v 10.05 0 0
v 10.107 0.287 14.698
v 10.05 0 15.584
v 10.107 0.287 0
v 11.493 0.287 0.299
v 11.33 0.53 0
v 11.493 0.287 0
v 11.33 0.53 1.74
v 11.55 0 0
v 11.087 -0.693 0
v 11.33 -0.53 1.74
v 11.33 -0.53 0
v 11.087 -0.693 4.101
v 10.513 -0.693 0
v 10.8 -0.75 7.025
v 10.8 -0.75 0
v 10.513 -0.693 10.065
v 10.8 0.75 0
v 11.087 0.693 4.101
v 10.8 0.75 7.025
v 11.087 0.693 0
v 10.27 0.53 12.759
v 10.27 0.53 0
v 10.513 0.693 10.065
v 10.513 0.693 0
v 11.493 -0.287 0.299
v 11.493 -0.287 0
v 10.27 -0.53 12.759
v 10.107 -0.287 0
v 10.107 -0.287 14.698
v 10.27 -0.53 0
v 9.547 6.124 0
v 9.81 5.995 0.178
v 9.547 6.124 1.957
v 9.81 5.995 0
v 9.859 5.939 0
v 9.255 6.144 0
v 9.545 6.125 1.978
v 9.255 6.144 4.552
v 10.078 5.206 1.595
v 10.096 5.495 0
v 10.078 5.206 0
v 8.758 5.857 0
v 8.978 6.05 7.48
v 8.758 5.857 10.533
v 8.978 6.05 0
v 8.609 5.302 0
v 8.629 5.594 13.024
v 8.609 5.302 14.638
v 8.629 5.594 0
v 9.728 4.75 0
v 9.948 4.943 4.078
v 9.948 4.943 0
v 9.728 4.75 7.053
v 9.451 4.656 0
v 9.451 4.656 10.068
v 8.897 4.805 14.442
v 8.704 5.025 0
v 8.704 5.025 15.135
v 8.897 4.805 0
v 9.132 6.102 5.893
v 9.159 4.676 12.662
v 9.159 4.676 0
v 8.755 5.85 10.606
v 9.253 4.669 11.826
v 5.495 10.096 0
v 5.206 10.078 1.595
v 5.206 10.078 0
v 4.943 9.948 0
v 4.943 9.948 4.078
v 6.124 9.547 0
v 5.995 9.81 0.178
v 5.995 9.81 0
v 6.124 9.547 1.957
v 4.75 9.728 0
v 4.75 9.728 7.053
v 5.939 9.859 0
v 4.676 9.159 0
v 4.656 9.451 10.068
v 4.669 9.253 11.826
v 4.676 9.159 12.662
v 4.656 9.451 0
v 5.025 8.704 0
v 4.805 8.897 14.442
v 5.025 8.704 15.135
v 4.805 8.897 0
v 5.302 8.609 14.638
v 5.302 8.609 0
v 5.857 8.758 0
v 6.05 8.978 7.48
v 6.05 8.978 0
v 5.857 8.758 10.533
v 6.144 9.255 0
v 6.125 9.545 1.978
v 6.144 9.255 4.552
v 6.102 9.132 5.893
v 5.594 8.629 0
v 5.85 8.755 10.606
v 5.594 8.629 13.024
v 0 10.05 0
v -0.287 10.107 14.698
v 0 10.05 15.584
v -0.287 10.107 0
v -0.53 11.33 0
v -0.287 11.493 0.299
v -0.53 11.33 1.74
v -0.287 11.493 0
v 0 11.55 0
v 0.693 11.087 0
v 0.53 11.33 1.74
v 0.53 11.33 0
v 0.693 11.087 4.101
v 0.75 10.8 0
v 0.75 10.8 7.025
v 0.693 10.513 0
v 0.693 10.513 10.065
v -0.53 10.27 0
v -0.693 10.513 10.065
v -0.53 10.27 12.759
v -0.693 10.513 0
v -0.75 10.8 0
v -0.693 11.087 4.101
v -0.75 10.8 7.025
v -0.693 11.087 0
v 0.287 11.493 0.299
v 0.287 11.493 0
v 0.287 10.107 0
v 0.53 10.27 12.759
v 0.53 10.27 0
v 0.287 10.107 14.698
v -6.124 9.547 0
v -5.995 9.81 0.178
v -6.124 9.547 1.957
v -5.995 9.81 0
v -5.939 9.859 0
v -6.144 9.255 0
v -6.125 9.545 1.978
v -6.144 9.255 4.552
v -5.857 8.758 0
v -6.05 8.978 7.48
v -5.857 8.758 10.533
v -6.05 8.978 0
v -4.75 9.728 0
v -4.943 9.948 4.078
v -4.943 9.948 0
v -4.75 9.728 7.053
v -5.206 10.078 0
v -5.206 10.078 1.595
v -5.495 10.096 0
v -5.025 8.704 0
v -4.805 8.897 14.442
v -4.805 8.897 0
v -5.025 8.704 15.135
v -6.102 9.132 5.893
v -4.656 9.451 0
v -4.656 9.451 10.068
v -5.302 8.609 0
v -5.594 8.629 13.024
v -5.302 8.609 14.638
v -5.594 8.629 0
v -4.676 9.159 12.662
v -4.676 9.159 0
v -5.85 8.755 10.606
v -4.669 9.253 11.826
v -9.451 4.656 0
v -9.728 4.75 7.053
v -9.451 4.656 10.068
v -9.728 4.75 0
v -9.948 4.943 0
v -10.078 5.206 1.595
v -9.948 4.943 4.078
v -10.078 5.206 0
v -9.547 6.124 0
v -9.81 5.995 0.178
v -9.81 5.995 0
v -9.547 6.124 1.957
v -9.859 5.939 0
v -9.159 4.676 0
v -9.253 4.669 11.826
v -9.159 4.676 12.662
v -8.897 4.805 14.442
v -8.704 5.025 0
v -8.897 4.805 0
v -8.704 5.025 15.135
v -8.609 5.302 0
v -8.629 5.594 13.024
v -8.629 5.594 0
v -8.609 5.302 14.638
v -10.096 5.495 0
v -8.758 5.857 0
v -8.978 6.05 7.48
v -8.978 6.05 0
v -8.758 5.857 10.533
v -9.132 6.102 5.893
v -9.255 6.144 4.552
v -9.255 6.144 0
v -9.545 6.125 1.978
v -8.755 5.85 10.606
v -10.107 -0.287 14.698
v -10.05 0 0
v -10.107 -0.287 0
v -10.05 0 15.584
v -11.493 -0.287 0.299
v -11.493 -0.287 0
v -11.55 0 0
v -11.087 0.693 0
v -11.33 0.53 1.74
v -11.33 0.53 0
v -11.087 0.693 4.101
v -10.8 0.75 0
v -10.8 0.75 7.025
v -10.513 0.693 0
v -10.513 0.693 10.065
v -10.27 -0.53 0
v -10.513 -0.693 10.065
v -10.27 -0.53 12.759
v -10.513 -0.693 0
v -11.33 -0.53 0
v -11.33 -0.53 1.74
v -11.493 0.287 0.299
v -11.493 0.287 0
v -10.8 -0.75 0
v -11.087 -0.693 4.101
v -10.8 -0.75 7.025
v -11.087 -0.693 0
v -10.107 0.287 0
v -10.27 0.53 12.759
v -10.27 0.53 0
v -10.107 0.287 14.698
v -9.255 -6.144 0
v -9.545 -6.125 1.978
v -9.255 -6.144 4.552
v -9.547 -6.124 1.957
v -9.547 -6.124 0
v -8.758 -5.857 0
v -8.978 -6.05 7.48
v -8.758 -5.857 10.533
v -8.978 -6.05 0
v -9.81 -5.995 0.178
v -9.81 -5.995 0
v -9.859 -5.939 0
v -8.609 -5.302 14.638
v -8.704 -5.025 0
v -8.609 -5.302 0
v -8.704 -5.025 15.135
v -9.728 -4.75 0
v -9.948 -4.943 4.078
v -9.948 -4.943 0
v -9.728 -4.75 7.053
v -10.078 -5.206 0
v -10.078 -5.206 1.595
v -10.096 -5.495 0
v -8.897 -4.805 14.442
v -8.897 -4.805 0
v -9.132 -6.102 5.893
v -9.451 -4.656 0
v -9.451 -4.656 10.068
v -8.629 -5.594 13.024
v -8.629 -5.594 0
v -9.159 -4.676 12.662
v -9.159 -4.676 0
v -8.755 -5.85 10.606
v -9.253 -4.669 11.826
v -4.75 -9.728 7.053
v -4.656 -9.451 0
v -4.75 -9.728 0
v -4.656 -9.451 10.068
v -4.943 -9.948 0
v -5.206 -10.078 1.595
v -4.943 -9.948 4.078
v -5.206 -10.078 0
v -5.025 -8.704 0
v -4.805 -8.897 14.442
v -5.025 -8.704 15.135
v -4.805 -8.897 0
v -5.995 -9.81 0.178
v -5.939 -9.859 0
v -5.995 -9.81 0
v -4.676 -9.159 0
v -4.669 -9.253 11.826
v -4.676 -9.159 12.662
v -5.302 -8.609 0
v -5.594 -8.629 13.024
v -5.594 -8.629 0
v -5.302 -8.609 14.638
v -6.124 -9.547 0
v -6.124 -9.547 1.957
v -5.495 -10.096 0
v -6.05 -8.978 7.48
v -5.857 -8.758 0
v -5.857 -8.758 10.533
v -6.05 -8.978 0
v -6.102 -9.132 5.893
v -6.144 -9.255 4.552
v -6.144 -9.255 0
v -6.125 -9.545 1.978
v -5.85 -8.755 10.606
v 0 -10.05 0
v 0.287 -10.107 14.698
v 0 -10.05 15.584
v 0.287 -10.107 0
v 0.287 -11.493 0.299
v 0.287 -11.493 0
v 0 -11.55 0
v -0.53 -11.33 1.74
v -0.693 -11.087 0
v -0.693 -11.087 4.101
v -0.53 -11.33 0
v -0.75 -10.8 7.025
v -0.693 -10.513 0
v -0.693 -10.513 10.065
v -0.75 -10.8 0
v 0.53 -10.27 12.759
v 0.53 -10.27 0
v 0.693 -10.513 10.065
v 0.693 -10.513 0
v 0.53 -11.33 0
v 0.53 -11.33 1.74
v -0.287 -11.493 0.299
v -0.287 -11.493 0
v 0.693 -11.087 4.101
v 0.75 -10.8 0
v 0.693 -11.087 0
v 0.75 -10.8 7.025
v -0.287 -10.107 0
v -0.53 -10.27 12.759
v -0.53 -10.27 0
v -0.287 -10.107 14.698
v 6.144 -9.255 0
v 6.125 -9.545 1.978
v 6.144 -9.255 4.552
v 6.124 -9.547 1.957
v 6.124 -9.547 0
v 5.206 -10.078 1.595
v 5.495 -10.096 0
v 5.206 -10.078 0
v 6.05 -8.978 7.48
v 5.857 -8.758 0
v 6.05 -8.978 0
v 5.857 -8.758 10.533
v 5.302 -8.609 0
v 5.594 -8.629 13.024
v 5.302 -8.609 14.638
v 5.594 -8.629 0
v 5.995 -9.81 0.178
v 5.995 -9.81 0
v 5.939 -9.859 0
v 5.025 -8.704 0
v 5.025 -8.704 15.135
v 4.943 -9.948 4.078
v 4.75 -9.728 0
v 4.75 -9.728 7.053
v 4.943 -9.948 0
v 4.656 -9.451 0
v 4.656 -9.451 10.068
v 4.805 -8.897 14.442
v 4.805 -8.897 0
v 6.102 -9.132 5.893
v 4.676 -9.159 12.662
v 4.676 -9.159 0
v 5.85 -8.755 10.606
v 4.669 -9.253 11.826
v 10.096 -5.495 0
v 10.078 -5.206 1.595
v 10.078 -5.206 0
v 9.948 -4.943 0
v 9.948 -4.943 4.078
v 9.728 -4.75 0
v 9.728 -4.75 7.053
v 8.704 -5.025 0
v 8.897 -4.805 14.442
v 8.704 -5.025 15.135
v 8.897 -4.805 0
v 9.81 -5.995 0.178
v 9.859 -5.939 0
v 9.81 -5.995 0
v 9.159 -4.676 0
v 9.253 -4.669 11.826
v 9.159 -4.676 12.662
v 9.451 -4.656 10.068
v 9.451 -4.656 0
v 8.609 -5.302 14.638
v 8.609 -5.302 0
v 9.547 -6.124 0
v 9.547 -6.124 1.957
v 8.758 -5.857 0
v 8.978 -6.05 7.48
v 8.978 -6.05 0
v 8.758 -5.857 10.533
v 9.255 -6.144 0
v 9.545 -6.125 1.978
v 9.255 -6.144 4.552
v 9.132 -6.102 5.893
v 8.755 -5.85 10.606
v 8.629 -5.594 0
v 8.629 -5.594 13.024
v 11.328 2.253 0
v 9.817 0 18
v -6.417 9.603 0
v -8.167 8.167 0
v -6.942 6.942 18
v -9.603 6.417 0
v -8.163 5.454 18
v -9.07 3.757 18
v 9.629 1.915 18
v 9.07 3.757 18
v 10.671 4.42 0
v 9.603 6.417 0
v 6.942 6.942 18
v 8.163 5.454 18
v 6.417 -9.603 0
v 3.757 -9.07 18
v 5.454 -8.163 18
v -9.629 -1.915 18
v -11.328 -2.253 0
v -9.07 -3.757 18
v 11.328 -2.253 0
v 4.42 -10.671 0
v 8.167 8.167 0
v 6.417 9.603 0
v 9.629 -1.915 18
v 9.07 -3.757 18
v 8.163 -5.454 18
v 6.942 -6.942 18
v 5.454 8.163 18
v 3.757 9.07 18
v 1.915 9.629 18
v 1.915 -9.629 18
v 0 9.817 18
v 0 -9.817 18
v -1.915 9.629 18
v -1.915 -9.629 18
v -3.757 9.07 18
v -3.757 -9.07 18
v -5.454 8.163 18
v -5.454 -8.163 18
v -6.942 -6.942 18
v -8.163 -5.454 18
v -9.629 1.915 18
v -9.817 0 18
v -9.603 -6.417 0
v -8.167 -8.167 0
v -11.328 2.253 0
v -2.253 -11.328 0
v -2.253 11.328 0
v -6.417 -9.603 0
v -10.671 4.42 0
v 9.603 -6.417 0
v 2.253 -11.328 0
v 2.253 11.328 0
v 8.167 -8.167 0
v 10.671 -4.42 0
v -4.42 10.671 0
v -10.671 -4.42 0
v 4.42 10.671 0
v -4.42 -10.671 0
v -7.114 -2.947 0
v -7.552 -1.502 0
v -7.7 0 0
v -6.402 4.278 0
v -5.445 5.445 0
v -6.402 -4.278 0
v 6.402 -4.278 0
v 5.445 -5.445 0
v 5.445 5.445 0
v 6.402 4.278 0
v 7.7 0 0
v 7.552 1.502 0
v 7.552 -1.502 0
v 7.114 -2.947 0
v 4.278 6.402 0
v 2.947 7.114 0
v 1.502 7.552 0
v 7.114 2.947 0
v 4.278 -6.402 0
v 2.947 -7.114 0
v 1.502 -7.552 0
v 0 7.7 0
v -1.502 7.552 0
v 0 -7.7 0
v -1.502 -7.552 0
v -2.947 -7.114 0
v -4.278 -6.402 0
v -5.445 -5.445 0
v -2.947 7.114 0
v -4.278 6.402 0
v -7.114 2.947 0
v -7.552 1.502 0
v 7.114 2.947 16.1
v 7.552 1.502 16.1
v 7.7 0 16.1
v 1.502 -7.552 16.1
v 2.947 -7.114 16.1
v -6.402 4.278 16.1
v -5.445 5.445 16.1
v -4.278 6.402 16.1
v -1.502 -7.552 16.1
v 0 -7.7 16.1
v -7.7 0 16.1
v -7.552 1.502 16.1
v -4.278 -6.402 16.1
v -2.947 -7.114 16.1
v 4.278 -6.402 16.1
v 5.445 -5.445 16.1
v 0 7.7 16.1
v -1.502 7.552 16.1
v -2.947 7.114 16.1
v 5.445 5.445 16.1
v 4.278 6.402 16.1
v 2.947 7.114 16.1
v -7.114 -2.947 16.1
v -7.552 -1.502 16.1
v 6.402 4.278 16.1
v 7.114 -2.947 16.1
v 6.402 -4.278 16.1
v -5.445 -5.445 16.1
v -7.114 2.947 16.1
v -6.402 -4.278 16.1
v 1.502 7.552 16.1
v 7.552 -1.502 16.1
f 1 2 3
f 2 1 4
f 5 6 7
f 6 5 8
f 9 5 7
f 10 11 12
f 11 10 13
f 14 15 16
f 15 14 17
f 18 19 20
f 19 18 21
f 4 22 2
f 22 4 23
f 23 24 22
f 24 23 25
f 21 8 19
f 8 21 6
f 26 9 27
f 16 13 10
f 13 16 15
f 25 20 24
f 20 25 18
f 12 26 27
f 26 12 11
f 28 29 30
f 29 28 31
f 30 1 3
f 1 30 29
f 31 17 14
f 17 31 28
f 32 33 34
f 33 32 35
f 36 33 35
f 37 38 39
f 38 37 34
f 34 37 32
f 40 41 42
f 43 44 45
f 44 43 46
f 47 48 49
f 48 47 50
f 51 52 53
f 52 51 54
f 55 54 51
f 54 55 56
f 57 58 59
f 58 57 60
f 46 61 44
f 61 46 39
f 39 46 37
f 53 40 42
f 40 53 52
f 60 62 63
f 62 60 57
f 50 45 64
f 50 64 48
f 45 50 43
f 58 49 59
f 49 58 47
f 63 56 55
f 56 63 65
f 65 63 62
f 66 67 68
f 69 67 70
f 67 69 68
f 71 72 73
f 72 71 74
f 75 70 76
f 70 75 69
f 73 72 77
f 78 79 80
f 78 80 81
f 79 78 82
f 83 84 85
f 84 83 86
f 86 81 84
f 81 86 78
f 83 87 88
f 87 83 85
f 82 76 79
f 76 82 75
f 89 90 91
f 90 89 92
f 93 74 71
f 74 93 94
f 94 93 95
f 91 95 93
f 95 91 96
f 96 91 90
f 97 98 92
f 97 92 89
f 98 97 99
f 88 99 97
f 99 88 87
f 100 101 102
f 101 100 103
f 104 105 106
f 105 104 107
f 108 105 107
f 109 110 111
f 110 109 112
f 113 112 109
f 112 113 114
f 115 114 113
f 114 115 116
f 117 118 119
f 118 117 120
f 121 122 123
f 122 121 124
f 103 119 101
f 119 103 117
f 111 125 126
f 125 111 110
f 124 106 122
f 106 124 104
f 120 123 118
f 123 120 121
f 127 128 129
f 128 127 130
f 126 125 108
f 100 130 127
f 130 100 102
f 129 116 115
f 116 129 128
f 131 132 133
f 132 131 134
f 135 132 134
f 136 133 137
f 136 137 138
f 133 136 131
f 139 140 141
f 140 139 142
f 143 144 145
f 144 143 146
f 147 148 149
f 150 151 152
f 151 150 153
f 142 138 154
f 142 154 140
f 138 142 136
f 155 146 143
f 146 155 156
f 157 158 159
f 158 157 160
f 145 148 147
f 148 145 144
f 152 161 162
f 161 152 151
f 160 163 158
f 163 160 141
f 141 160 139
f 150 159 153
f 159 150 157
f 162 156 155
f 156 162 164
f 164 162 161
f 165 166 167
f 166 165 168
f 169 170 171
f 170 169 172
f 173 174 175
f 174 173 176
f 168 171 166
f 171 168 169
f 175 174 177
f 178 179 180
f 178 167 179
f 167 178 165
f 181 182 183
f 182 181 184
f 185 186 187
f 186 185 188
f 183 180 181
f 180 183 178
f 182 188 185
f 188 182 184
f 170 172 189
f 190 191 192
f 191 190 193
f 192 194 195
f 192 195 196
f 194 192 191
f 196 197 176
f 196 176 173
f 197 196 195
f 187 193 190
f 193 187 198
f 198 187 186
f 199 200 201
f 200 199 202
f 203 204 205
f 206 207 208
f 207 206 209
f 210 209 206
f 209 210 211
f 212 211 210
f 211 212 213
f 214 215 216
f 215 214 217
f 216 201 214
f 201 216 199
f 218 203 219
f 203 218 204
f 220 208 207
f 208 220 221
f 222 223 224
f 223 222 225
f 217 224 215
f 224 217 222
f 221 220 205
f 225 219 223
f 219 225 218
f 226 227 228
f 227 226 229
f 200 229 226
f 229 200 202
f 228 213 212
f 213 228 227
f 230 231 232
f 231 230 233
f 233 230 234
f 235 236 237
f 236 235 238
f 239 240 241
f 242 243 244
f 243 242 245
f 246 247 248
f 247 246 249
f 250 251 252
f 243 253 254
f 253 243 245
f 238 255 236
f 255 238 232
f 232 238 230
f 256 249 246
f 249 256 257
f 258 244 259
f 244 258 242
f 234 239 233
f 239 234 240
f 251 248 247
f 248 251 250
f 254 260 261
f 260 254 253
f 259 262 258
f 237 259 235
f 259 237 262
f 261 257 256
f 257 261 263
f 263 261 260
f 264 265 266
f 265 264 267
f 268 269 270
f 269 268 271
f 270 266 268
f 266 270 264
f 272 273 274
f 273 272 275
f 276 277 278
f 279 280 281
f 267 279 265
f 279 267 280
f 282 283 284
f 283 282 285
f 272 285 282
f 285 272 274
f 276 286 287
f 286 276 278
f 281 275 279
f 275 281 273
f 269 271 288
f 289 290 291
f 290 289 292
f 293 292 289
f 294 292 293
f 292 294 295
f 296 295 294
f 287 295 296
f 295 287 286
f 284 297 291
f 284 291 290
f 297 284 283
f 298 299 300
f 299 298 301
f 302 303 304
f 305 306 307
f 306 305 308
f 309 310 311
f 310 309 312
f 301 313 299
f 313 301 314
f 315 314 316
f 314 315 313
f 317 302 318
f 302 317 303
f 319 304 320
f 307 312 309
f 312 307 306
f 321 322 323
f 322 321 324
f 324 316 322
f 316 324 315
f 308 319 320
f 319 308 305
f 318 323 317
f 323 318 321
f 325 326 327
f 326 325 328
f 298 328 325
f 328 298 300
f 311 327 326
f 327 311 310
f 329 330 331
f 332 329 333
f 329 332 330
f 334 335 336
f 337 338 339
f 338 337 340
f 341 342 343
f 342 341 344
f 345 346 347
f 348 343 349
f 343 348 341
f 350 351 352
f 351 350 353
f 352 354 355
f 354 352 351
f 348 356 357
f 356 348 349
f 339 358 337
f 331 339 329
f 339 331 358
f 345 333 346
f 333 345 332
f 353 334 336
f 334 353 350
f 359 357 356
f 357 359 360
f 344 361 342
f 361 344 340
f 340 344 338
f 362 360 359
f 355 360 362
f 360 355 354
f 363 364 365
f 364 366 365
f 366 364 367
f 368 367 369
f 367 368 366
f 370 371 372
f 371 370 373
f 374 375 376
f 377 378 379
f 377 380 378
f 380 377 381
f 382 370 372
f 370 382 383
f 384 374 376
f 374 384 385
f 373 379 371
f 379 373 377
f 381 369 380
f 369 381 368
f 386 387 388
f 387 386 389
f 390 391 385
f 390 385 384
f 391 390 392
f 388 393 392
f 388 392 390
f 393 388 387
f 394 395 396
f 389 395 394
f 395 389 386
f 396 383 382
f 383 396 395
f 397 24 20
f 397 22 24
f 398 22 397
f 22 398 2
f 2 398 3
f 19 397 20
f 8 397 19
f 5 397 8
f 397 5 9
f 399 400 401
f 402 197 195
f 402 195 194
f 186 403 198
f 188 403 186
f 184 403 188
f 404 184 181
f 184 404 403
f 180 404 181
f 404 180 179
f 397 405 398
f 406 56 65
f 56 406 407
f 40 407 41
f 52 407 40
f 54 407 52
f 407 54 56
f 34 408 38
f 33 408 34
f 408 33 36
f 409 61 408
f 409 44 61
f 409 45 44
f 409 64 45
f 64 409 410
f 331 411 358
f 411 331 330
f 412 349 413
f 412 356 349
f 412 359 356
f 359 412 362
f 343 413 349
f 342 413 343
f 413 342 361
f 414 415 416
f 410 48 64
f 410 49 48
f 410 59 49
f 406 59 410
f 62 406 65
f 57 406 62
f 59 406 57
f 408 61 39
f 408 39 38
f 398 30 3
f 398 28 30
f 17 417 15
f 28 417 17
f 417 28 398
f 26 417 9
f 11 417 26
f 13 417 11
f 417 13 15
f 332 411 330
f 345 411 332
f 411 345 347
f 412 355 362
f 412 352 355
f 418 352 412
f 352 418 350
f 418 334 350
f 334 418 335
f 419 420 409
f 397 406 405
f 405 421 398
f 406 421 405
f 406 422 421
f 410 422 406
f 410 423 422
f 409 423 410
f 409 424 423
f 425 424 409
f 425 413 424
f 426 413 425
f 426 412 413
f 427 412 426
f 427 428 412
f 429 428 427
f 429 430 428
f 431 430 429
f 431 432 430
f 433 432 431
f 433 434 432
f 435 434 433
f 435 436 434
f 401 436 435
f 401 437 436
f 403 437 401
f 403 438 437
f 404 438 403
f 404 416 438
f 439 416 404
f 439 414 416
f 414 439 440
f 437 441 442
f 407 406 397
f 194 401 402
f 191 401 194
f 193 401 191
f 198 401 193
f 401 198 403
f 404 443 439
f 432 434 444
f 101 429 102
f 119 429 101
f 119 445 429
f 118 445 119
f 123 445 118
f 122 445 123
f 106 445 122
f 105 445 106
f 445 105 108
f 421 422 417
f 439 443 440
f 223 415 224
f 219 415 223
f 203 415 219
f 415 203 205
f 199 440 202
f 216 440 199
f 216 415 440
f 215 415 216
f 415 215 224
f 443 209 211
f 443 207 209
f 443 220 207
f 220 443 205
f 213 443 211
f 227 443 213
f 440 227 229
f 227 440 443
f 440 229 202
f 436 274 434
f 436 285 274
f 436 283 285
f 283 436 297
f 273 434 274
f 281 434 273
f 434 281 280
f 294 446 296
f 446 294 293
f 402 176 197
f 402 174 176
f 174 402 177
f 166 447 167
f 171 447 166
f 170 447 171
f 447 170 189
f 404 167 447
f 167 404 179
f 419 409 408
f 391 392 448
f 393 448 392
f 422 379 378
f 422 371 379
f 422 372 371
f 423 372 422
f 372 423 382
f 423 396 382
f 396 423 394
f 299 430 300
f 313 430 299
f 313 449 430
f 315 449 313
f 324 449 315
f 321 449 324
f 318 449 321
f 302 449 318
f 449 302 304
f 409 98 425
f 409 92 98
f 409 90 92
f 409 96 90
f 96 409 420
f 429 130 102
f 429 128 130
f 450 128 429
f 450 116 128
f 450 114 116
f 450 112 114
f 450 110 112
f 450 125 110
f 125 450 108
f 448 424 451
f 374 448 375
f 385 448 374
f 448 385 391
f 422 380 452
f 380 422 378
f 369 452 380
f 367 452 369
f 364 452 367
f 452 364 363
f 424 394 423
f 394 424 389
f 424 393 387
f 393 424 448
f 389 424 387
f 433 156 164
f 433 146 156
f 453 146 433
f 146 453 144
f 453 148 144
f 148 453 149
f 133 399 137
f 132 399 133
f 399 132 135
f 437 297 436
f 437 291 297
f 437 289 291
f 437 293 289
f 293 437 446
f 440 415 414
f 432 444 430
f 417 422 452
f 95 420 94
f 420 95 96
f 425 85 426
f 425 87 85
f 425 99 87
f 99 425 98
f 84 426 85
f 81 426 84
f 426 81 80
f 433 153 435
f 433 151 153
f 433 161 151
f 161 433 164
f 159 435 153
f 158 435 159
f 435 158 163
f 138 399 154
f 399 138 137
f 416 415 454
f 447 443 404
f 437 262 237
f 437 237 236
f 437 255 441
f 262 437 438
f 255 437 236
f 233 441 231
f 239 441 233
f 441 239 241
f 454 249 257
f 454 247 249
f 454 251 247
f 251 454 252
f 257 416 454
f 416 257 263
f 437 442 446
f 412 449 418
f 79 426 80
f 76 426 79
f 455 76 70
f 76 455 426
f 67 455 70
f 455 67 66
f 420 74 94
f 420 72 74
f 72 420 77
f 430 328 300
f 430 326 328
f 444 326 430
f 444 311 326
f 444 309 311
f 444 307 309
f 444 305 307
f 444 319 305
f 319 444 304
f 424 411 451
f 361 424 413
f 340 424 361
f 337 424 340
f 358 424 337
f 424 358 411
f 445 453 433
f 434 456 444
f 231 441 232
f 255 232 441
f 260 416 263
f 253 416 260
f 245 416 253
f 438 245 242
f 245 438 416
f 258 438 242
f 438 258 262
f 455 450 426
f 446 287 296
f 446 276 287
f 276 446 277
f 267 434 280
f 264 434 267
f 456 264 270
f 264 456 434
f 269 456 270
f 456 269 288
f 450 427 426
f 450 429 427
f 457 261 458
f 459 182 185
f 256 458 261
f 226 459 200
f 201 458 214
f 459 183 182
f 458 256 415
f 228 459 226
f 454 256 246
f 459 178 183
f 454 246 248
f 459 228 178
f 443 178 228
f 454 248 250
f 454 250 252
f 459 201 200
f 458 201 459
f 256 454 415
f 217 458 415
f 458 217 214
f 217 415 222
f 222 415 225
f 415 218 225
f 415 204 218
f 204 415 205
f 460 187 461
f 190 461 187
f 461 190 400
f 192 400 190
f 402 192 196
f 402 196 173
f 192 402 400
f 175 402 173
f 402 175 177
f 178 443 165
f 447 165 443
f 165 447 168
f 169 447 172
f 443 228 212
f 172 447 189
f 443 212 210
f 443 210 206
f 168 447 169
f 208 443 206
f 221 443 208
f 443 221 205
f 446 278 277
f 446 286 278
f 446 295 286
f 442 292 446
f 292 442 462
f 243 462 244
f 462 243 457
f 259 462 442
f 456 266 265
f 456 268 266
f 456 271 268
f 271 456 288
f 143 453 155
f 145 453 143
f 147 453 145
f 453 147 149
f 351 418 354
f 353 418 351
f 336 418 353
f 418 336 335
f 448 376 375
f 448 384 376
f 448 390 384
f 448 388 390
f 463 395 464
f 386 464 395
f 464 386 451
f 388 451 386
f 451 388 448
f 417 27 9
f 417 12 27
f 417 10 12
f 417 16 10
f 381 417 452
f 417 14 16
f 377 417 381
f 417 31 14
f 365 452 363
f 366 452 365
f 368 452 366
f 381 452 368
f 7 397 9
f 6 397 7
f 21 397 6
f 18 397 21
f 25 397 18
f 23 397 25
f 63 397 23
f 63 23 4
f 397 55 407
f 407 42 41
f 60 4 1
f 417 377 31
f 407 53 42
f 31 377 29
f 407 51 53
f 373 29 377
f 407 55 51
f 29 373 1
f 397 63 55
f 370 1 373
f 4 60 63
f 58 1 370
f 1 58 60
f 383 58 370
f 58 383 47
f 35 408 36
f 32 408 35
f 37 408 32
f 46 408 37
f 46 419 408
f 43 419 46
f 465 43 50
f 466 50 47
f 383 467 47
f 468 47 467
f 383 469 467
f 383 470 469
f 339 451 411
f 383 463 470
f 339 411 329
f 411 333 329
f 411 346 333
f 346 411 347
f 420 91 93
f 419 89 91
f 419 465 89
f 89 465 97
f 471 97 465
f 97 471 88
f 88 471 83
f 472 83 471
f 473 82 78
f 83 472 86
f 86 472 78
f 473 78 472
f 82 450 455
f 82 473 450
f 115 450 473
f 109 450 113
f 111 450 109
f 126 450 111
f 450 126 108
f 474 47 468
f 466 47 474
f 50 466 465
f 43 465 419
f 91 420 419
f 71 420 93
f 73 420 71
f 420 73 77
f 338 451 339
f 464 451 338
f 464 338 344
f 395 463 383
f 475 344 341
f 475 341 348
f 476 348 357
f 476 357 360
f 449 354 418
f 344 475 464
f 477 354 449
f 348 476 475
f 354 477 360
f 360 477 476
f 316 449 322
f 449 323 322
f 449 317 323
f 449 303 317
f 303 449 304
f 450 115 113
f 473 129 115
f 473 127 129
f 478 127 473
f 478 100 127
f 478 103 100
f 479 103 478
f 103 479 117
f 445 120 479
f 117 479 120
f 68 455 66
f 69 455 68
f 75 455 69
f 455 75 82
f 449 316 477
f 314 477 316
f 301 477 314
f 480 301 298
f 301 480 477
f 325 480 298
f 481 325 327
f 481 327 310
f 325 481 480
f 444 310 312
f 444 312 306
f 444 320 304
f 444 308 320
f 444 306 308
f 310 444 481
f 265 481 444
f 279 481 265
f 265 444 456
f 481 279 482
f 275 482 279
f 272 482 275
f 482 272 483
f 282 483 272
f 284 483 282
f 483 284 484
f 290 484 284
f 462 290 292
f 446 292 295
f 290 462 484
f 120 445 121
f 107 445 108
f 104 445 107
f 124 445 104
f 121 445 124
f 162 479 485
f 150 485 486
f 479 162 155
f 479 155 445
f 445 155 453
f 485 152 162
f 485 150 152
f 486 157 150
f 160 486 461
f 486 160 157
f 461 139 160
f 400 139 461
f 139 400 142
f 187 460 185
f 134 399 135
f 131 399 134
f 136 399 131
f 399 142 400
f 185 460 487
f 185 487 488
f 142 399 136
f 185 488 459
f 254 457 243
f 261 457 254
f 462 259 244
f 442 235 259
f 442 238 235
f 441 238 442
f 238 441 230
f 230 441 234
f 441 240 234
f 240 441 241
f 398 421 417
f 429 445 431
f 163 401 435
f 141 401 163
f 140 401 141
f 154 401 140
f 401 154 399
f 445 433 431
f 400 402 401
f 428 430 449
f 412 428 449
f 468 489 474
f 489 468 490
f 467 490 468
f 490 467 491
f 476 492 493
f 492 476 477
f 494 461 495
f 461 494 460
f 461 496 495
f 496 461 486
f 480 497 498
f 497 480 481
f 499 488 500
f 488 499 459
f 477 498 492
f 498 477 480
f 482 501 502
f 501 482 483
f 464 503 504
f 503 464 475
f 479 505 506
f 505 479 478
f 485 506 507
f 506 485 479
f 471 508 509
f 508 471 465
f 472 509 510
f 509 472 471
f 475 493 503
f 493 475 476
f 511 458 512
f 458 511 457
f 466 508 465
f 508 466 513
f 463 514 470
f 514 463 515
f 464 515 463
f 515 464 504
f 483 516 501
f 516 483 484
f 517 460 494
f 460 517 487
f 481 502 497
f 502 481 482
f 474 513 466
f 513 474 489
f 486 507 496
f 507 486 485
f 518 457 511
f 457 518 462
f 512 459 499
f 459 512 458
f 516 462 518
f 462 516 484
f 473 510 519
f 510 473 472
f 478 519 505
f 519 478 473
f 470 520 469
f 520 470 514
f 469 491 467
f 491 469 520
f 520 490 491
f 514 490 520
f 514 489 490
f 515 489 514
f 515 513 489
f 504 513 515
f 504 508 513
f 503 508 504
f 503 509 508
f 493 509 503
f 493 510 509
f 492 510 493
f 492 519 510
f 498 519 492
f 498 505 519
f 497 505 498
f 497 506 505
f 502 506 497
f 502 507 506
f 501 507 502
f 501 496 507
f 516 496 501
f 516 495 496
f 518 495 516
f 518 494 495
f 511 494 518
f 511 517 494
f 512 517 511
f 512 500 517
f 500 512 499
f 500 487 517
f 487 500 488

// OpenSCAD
// ACCESS KNOB — ARP / Modular Synth Slider Knob (Slip-On Sleeve)
// Generated via CLI for Studio Knobs (Slip-On Sleeve)
module access_knob_arp_slider_knob_slipon() {
  outer_d = 23.1;
  height = 18;
  taper = 0.85;
  bore_d = 15.1;
  slot_h = 16;
  tex_depth = 1.5;
  tex_scale = 1.5;
  tex_count = 12;

  difference() {
    cylinder(h=height, d1=outer_d, d2=outer_d*taper, $fn=32);
    translate([0,0,-0.1]) cylinder(h=slot_h+0.2, d=bore_d + 0.3, $fn=32);
    for(i=[0:tex_count-1]) {
      rotate([0,0,i*(360/tex_count)])
        translate([outer_d/2-tex_depth/2, 0, height/2])
          cylinder(h=height*1.1, d=tex_scale, center=true, $fn=16);
    }
  }
}
access_knob_arp_slider_knob_slipon();
